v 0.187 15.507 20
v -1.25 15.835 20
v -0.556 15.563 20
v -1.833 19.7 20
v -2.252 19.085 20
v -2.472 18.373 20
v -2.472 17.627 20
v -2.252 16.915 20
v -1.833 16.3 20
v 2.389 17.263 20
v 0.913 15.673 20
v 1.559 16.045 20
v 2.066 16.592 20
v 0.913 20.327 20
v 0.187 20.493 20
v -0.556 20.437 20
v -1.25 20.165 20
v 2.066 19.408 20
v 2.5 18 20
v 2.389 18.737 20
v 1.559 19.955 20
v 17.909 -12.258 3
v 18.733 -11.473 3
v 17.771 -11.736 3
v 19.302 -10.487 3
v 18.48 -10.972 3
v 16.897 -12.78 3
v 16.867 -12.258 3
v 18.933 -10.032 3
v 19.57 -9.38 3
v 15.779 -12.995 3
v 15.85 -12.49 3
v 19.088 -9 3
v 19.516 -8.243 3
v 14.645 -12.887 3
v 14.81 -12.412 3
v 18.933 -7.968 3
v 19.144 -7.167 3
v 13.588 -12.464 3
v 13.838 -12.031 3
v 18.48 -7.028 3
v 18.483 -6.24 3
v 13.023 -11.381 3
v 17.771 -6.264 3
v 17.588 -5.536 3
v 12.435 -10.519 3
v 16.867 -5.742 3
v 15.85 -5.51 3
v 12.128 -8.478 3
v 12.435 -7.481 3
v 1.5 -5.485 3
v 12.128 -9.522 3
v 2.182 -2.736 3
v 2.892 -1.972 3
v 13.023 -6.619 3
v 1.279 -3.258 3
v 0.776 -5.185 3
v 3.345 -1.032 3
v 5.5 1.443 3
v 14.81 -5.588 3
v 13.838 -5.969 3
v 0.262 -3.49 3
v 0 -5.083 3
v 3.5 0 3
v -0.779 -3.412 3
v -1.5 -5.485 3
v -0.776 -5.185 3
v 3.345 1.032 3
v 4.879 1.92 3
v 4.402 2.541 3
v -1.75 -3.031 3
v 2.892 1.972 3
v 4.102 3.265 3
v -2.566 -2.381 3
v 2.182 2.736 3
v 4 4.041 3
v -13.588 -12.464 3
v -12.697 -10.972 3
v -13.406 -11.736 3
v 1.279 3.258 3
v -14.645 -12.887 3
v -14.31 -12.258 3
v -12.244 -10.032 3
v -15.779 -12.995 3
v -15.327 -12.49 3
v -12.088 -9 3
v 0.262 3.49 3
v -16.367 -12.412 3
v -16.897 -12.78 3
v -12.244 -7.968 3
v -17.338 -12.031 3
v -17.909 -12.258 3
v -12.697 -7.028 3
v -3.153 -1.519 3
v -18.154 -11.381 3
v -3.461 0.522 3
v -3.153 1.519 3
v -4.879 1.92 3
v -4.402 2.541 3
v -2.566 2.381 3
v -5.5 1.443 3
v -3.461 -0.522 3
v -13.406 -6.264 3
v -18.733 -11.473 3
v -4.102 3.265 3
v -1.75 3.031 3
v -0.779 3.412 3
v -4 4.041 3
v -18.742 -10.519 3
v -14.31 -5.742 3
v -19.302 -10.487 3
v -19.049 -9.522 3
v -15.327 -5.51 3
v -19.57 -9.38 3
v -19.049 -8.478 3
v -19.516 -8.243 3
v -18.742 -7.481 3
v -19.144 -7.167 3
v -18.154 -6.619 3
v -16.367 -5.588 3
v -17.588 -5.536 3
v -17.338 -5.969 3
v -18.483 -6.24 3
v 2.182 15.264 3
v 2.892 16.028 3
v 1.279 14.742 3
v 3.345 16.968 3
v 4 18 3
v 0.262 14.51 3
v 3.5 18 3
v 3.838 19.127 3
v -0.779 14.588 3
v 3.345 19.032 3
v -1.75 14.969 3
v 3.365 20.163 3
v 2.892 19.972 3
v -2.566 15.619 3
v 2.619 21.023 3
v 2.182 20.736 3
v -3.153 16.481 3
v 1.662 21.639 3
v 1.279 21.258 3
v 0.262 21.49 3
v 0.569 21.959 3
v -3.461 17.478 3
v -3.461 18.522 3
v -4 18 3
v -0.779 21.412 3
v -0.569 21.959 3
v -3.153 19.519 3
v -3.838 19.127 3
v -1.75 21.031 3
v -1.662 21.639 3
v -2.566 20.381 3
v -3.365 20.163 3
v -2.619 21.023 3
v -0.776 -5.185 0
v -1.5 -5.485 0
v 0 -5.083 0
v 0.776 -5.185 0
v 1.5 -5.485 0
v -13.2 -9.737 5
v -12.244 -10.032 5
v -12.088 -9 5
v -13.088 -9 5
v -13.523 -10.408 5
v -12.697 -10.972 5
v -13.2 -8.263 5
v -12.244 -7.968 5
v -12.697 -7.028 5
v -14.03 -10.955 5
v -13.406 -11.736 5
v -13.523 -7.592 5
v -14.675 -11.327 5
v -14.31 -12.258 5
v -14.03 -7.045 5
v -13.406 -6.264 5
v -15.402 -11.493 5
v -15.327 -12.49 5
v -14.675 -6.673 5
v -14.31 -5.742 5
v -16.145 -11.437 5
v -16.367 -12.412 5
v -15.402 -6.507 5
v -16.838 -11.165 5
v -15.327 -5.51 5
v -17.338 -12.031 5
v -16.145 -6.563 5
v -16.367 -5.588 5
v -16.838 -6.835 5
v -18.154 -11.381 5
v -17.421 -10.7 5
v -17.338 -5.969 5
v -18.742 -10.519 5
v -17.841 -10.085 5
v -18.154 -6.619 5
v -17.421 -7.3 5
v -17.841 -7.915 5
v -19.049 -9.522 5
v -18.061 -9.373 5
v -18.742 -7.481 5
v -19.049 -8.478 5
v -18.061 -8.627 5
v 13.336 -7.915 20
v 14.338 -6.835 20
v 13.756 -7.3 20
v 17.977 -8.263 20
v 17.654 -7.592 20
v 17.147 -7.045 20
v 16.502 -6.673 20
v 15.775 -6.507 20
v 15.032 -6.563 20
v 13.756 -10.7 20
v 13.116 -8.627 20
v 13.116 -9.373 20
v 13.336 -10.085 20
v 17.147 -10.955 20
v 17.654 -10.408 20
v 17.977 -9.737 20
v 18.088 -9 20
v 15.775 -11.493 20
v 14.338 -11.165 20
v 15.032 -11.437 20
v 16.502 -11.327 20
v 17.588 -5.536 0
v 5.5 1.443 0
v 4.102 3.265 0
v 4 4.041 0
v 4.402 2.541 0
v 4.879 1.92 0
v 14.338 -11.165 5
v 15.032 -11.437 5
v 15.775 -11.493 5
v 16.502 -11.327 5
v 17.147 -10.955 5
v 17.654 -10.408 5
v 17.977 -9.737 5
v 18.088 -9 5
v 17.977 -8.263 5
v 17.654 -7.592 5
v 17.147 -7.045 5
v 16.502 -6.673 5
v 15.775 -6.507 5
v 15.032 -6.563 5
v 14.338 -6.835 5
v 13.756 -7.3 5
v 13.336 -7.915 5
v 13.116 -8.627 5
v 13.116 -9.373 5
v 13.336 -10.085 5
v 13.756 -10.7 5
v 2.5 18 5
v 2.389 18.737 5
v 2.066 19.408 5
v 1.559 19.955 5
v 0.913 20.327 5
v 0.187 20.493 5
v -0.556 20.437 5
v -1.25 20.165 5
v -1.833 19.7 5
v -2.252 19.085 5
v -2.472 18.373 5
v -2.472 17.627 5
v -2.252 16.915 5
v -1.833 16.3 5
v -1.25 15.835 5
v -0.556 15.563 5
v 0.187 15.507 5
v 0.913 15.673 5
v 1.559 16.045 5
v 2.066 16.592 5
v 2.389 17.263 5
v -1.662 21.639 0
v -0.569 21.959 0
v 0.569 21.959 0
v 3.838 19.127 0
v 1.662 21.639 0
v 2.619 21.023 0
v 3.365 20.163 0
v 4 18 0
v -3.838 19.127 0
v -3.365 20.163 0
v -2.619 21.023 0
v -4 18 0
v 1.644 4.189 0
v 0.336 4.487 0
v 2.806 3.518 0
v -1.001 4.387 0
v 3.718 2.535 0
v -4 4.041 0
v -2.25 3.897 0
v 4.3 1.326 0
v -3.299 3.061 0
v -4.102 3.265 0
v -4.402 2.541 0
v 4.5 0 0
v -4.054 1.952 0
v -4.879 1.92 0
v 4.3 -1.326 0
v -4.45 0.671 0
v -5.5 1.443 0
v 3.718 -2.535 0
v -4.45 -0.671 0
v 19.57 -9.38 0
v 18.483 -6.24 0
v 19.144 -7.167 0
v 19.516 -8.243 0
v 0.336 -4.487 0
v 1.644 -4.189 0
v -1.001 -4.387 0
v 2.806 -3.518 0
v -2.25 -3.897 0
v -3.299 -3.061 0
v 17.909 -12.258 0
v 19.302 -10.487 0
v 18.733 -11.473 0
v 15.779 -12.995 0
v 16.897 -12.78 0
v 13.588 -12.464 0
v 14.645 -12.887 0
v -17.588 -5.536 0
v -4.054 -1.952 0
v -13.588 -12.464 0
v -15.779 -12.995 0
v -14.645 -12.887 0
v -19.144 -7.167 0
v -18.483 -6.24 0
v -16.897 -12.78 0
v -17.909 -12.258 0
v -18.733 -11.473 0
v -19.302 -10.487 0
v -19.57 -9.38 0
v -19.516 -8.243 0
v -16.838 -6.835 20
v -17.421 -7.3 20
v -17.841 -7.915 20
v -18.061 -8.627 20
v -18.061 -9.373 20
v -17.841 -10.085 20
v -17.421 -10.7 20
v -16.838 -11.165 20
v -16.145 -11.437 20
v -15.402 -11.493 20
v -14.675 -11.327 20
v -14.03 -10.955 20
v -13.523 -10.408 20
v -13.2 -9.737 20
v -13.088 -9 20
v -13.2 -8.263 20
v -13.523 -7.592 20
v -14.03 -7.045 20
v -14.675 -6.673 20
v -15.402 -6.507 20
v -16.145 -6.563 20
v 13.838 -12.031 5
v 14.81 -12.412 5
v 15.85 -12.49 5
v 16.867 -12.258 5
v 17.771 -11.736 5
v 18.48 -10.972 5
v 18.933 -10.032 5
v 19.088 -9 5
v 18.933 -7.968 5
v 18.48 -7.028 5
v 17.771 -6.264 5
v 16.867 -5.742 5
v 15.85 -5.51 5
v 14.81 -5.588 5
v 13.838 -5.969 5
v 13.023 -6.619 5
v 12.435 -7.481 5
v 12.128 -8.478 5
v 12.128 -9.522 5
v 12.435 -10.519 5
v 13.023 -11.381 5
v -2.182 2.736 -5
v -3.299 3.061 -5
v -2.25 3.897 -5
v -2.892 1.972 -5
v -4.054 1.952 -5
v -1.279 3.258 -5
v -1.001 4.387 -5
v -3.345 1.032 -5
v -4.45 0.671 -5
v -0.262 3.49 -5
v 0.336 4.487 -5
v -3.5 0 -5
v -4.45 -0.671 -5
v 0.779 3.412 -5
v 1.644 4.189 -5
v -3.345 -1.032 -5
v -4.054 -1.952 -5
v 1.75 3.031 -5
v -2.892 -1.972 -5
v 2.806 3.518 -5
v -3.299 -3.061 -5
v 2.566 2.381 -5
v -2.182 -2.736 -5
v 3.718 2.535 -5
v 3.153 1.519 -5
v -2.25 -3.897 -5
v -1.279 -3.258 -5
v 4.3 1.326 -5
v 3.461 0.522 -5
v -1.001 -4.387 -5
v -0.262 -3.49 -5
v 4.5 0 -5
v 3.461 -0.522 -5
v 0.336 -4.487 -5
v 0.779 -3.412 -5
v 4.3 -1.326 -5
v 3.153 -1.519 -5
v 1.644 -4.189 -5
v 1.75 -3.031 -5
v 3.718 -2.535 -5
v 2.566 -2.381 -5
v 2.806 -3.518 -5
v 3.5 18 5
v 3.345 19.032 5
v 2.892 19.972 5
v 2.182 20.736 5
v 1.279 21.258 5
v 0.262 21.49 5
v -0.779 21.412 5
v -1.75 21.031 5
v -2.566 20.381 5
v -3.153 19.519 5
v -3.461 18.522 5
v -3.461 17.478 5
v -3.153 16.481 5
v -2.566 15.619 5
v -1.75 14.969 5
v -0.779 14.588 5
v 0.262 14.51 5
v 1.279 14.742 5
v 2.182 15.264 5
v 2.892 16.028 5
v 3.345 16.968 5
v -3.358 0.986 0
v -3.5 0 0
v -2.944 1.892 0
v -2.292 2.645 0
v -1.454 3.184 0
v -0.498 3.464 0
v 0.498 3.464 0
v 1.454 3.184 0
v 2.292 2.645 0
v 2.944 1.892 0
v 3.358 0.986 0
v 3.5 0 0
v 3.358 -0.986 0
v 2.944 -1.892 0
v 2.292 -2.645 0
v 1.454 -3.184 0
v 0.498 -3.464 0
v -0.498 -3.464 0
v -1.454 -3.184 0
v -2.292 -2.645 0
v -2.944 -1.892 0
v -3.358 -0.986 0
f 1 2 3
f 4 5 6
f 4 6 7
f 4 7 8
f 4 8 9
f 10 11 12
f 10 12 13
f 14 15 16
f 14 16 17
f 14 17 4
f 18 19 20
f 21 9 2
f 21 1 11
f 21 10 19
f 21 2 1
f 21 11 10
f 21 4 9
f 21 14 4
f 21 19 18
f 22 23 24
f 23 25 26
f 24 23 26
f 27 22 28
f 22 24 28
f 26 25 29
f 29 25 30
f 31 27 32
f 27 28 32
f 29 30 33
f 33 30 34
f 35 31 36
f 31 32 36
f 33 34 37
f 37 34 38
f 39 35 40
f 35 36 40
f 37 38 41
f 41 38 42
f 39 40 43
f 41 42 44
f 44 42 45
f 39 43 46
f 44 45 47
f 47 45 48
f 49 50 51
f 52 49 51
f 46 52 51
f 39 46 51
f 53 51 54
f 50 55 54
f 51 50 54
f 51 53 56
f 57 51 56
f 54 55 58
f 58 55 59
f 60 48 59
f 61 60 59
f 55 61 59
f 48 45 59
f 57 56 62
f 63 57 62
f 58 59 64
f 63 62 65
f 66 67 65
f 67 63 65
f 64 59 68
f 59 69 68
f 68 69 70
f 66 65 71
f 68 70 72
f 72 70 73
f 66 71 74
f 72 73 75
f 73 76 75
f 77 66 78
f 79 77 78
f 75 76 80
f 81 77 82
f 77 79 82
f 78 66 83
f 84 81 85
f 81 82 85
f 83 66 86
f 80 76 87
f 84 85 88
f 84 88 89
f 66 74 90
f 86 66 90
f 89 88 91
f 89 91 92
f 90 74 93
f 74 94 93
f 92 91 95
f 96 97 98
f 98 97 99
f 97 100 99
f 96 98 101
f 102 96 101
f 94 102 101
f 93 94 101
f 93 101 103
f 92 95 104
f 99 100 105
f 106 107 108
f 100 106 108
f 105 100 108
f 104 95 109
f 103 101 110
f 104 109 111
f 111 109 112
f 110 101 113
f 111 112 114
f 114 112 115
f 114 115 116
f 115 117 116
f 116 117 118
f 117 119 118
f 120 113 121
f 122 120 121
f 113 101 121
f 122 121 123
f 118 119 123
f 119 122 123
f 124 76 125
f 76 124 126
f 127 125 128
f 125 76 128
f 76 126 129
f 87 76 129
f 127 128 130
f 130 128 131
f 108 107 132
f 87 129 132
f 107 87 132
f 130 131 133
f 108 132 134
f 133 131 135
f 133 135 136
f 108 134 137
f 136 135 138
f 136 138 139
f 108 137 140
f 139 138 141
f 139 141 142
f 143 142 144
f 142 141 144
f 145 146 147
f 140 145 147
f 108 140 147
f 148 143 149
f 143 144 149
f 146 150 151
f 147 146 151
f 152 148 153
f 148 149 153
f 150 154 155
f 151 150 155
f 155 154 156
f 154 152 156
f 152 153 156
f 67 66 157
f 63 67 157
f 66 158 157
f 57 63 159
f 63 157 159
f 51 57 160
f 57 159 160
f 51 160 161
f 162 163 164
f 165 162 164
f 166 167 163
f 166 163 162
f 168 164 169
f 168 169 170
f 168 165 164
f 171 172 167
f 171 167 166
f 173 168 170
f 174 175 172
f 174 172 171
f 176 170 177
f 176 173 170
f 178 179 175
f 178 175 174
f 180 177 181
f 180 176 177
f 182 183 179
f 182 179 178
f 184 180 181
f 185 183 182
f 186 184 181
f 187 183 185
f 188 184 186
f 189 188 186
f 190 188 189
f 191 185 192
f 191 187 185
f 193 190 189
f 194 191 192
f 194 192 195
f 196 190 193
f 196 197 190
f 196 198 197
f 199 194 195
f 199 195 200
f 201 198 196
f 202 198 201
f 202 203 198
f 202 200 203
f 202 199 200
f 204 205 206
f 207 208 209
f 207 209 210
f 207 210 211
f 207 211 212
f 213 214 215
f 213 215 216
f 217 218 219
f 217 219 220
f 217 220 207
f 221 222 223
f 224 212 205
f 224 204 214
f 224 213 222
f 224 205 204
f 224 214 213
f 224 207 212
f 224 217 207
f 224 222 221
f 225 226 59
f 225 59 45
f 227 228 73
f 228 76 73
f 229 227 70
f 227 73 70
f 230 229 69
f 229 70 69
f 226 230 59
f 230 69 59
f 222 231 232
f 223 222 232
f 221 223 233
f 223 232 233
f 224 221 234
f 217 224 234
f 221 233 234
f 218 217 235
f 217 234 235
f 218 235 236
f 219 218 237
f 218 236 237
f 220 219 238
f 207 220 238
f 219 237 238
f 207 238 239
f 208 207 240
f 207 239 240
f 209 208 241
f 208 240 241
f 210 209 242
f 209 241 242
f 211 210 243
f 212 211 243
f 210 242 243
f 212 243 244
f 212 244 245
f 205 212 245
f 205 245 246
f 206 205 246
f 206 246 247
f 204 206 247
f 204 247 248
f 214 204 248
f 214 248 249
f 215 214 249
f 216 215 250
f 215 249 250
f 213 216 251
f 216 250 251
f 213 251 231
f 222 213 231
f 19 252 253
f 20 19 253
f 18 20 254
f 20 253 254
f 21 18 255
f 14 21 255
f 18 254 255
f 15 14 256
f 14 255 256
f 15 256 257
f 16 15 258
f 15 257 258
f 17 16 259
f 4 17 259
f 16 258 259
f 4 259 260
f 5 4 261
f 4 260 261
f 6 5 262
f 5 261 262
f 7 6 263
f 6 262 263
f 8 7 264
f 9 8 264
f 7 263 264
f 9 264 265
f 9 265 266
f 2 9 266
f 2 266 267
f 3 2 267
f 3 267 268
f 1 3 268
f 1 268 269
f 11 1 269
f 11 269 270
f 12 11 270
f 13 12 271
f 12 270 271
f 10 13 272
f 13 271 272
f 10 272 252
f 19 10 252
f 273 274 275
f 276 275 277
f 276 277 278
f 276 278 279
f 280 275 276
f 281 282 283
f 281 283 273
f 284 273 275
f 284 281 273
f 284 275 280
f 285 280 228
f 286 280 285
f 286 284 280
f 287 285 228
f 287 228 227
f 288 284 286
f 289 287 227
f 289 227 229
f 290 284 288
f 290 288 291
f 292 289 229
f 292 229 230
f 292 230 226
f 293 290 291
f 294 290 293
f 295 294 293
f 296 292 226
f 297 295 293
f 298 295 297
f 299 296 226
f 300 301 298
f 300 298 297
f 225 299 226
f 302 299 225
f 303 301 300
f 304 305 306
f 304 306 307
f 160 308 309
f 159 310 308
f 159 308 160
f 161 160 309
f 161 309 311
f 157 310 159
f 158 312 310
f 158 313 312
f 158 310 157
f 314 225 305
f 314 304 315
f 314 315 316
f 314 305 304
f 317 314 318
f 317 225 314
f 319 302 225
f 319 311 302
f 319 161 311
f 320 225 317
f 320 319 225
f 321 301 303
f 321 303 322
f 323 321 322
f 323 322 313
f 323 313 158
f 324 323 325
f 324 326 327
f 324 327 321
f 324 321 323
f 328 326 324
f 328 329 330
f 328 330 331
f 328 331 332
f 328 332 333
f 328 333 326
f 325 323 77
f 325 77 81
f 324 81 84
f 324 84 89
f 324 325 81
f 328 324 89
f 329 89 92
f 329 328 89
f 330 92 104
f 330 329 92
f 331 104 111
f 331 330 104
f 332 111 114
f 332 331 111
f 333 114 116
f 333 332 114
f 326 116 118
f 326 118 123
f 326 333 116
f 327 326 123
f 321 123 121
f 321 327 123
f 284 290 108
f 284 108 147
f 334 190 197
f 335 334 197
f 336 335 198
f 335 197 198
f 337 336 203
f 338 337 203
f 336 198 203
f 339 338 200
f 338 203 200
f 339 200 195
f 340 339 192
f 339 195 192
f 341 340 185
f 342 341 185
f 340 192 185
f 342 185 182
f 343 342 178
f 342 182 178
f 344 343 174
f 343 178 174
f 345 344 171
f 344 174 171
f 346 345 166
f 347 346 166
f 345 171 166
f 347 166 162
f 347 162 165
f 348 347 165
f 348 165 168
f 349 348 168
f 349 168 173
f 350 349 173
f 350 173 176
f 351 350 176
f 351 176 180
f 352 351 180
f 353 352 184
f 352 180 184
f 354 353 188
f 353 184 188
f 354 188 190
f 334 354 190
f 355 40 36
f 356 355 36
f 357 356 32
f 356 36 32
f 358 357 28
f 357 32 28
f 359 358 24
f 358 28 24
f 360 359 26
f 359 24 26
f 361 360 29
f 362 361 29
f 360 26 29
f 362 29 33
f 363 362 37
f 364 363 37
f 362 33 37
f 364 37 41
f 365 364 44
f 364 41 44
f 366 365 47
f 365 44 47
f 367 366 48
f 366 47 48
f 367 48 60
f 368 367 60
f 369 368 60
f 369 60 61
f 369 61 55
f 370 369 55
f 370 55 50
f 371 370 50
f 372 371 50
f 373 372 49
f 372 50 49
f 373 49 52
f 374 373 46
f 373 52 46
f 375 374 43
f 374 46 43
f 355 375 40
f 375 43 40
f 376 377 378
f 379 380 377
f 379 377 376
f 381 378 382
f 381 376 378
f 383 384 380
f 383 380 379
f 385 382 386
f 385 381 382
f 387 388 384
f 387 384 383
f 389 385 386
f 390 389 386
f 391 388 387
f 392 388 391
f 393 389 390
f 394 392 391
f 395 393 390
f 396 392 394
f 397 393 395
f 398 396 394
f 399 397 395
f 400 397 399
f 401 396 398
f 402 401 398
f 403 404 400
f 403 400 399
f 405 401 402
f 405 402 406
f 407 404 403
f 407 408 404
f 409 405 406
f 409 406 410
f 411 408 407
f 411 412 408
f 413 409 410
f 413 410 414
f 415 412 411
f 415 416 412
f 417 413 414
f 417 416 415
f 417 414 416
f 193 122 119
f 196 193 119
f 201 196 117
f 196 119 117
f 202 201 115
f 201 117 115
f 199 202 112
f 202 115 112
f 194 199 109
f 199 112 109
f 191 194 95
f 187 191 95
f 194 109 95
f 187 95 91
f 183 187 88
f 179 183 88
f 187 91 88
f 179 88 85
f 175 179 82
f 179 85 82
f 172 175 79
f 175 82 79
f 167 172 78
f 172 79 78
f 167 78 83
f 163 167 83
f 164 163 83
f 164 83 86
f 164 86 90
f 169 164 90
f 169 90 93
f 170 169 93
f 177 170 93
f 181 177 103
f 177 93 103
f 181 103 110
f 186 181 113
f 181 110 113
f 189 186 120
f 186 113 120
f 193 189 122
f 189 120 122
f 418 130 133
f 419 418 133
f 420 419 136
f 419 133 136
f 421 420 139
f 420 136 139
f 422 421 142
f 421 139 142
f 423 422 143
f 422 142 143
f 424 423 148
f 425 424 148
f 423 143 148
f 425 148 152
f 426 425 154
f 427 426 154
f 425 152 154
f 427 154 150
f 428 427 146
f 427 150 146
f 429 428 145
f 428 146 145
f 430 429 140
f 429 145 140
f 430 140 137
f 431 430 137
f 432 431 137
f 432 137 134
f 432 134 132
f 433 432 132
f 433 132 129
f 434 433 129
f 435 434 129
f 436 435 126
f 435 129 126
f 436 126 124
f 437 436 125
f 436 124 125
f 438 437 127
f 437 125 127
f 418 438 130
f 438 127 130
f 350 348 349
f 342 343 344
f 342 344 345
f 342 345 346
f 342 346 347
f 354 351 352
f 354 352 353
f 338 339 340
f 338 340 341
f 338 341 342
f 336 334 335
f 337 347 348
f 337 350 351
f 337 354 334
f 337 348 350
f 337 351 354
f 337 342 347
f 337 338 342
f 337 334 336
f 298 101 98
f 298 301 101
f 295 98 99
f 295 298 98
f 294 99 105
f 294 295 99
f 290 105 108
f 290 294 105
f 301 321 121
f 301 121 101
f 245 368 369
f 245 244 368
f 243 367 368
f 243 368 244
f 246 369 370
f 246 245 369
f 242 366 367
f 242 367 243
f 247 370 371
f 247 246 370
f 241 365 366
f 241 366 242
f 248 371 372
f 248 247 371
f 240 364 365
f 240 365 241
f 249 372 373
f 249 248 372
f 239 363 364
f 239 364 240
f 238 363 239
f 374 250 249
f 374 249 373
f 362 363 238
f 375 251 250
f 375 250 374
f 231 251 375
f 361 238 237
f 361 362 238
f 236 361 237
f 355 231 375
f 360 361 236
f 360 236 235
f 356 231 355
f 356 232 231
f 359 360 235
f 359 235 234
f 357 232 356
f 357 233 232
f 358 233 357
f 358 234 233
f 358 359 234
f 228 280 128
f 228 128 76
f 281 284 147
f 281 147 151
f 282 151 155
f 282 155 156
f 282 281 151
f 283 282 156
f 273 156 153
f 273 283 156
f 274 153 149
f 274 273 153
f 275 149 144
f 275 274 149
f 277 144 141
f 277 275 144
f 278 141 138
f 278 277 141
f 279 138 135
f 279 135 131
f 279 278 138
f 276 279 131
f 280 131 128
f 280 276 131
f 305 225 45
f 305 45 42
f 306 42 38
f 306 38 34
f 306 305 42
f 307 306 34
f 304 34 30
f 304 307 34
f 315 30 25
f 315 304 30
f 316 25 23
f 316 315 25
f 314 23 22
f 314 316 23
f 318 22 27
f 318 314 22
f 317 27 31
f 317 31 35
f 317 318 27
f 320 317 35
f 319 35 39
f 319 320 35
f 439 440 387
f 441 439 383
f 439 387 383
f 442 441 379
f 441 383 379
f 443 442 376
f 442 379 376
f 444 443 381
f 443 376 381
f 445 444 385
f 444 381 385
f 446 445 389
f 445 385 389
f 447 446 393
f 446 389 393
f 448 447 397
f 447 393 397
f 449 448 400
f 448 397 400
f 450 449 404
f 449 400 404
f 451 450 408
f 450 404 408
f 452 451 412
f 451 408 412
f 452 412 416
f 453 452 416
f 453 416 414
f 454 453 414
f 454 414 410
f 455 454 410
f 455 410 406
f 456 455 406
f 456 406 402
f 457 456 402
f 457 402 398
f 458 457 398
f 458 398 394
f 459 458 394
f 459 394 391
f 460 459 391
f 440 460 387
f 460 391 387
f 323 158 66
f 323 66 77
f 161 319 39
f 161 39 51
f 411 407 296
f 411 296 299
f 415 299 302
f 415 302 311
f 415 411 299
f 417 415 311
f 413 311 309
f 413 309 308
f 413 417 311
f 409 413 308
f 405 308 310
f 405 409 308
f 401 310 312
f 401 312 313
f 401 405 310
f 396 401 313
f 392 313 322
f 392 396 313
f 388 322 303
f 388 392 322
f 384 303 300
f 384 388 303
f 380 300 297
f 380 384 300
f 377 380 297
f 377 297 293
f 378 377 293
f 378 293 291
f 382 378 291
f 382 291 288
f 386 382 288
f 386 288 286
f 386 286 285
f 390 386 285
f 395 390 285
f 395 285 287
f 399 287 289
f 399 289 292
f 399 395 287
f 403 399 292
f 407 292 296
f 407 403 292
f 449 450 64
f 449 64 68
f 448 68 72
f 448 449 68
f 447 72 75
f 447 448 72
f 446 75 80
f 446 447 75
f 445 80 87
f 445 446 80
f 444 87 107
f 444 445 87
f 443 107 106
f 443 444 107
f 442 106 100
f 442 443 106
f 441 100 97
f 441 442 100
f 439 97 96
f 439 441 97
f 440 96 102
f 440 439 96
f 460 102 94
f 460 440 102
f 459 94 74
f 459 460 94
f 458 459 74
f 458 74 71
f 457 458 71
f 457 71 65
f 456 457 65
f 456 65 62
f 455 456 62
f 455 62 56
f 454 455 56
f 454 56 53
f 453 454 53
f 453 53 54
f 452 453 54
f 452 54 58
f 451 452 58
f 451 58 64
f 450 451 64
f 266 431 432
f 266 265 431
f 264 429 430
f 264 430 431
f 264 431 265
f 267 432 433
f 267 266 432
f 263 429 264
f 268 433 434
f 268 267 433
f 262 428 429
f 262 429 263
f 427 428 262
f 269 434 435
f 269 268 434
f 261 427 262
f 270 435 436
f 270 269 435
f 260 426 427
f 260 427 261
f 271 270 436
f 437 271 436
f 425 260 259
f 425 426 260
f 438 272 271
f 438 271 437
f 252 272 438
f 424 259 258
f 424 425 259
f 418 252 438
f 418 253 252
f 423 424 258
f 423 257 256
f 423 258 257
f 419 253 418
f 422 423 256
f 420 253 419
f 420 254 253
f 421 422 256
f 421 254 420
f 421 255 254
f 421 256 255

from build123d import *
from build123d.topology import SkipClean

# Parameters (mm, degrees)
SKETCH2_R           = 3.5
BOSS_EXTRUDE1_DEPTH = 3
SKETCH3_R           = 3.5
BOSS_EXTRUDE2_DEPTH = 2
SKETCH4_R           = 2.5
BOSS_EXTRUDE3_DEPTH = 15
CIRPATTERN1_COUNT   = 3
FILLET1_R           = 3
BOSS_EXTRUDE4_START = 5
SKETCH5_R           = 4.5
SKETCH5_R_2         = 3.5
BOSS_EXTRUDE4_DEPTH = 5


with BuildPart() as part:
    # Sketch2 → Boss-Extrude1 (new body)
    with BuildSketch(Plane.XY):
        with BuildLine():
            Line((-4, 0), (-4, 18))
            ThreePointArc((-4, 18), (0, 22), (4, 18))
            Line((4, 18), (4, 0))
            ThreePointArc((4, 0), (0, -4), (-4, 0))
        make_face()
        Circle(SKETCH2_R, mode=Mode.SUBTRACT)
    boss_extrude1 = extrude(amount=BOSS_EXTRUDE1_DEPTH)

    # Sketch3 → Boss-Extrude2 (add)
    with BuildSketch(Plane.XY.offset(3)):
        with Locations((0, 18)):
            Circle(SKETCH3_R)
    boss_extrude2 = extrude(amount=BOSS_EXTRUDE2_DEPTH)

    # Sketch4 → Boss-Extrude3 (add)
    with BuildSketch(Plane.XY.offset(5)):
        with Locations((0, 18)):
            Circle(SKETCH4_R)
    boss_extrude3 = extrude(amount=BOSS_EXTRUDE3_DEPTH)

    # CirPattern1: Boss-Extrude1, Boss-Extrude2, Boss-Extrude3 ×3 about axis
    cirpattern1_axis = Axis((0, 0, 0), (0, 0, 1))
    add([boss_extrude1.rotate(cirpattern1_axis, i * 360 / CIRPATTERN1_COUNT) for i in range(1, CIRPATTERN1_COUNT)])
    add([boss_extrude2.rotate(cirpattern1_axis, i * 360 / CIRPATTERN1_COUNT) for i in range(1, CIRPATTERN1_COUNT)])
    add([boss_extrude3.rotate(cirpattern1_axis, i * 360 / CIRPATTERN1_COUNT) for i in range(1, CIRPATTERN1_COUNT)])

    # Fillet1
    fillet1_edges = [part.edges().sort_by_distance(p)[0] for p in [
        (-4, 2.309401077, 1.5),
        (4, 2.309401077, 1.5),
        (0, -4.618802154, 1.5),
    ]]
    fillet(fillet1_edges, radius=FILLET1_R)

    # Sketch5 → Boss-Extrude4 (add)
    with SkipClean():  # the faces are left unmerged after this step: merging them gives an invalid solid
        with BuildSketch(Plane(origin=(0, 0, 0), x_dir=(-1, 0, 0), z_dir=(0, 0, -1)).offset(BOSS_EXTRUDE4_START)):
            with Locations(Location((0, 0, 0), (0, 0, 180))):
                Circle(SKETCH5_R)
            Circle(SKETCH5_R_2, mode=Mode.SUBTRACT)
        extrude(amount=-BOSS_EXTRUDE4_DEPTH)


solid = part.part
